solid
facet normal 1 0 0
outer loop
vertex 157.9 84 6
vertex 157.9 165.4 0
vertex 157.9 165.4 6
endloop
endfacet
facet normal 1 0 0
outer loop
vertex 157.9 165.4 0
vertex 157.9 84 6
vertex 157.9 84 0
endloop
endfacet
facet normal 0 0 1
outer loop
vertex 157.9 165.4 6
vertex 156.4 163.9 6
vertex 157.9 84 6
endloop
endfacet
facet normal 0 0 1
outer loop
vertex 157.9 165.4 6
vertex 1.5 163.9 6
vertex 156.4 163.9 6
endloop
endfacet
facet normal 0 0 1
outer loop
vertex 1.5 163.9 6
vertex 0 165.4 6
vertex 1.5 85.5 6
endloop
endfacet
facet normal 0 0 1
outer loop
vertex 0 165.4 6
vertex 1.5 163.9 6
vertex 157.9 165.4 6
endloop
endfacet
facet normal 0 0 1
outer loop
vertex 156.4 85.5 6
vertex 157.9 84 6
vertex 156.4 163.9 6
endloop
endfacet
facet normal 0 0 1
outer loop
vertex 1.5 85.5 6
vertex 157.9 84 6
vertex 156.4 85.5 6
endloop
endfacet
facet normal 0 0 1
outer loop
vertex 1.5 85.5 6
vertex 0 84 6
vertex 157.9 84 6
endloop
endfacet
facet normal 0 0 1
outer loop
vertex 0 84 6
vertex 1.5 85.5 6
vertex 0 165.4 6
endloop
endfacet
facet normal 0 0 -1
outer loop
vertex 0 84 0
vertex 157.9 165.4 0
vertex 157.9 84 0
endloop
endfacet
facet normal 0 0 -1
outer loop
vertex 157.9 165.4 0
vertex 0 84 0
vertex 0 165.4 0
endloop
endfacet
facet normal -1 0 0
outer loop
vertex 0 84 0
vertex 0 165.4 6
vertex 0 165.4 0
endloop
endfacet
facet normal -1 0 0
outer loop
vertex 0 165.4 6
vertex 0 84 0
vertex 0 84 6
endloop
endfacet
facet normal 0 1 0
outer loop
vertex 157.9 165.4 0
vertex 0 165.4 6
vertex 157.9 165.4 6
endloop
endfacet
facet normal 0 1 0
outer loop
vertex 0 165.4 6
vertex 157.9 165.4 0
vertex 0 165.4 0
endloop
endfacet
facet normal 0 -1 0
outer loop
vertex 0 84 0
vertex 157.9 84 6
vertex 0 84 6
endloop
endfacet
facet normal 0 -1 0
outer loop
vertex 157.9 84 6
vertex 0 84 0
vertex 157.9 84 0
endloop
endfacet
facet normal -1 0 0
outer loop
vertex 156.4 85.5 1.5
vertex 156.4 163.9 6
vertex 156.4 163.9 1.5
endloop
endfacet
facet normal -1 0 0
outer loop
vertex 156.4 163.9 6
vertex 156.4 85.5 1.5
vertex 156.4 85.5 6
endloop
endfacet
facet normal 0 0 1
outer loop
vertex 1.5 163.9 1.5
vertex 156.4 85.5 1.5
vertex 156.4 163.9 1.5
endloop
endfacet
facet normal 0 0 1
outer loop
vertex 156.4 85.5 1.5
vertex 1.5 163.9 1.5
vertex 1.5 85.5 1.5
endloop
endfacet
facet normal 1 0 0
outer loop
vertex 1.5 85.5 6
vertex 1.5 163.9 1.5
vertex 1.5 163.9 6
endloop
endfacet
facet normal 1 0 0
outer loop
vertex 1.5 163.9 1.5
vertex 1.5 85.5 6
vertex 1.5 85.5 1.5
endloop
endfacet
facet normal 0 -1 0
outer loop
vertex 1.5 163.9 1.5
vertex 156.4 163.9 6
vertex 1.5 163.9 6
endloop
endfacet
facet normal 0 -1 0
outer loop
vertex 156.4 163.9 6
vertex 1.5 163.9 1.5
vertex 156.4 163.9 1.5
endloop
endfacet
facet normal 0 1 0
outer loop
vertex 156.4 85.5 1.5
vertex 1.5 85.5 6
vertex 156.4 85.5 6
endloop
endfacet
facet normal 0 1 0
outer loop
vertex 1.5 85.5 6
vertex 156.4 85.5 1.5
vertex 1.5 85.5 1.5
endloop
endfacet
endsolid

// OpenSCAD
// Settings
wall=1.5;
lid_top=wall*4;
bleed=.2;

box_x=75;
box_y=box_x;
box_z=box_x/2.5;

// What to print
print_box = 0;
print_lid = 1;

// internal s tuff
outer_x=box_x*2+wall*3;
outer_y=box_y+wall*2;
outer_z=box_z+wall;

echo("outer_x is ", outer_x, "and outer_y is ", outer_y, "and outer_z is ", outer_z);
echo("(outer_x + wall * 4) is ", (outer_x + wall * 4));
echo("Lid size, outer_x+wall*2+bleed*2 = ", outer_x+wall*2+bleed*2, 
  "outer_y+wall*2+bleed*2 = ", outer_y+wall*2+bleed*2);

if (print_box) {
    difference() {
        cube([outer_x,outer_y,outer_z]);
        translate([wall,wall,wall]) {
            cube([box_x,box_y,box_z+wall]);
        }
        translate([box_x+wall*2,wall,wall]) {
            cube([box_x,box_y,box_z+wall]);
        }
    }
}

if (print_lid) {
    translate([0, (outer_y + wall * 4),0]) {
        difference() {
            cube([outer_x+wall*2+bleed*2,outer_y+wall*2+bleed*2,lid_top]);
//            cube([outer_x+wall*2,outer_y+wall*2,lid_top]);
            translate([wall,wall,wall]) {
                cube([outer_x+bleed*2,outer_y+bleed*2,lid_top]);
            }
        }
    }
}
